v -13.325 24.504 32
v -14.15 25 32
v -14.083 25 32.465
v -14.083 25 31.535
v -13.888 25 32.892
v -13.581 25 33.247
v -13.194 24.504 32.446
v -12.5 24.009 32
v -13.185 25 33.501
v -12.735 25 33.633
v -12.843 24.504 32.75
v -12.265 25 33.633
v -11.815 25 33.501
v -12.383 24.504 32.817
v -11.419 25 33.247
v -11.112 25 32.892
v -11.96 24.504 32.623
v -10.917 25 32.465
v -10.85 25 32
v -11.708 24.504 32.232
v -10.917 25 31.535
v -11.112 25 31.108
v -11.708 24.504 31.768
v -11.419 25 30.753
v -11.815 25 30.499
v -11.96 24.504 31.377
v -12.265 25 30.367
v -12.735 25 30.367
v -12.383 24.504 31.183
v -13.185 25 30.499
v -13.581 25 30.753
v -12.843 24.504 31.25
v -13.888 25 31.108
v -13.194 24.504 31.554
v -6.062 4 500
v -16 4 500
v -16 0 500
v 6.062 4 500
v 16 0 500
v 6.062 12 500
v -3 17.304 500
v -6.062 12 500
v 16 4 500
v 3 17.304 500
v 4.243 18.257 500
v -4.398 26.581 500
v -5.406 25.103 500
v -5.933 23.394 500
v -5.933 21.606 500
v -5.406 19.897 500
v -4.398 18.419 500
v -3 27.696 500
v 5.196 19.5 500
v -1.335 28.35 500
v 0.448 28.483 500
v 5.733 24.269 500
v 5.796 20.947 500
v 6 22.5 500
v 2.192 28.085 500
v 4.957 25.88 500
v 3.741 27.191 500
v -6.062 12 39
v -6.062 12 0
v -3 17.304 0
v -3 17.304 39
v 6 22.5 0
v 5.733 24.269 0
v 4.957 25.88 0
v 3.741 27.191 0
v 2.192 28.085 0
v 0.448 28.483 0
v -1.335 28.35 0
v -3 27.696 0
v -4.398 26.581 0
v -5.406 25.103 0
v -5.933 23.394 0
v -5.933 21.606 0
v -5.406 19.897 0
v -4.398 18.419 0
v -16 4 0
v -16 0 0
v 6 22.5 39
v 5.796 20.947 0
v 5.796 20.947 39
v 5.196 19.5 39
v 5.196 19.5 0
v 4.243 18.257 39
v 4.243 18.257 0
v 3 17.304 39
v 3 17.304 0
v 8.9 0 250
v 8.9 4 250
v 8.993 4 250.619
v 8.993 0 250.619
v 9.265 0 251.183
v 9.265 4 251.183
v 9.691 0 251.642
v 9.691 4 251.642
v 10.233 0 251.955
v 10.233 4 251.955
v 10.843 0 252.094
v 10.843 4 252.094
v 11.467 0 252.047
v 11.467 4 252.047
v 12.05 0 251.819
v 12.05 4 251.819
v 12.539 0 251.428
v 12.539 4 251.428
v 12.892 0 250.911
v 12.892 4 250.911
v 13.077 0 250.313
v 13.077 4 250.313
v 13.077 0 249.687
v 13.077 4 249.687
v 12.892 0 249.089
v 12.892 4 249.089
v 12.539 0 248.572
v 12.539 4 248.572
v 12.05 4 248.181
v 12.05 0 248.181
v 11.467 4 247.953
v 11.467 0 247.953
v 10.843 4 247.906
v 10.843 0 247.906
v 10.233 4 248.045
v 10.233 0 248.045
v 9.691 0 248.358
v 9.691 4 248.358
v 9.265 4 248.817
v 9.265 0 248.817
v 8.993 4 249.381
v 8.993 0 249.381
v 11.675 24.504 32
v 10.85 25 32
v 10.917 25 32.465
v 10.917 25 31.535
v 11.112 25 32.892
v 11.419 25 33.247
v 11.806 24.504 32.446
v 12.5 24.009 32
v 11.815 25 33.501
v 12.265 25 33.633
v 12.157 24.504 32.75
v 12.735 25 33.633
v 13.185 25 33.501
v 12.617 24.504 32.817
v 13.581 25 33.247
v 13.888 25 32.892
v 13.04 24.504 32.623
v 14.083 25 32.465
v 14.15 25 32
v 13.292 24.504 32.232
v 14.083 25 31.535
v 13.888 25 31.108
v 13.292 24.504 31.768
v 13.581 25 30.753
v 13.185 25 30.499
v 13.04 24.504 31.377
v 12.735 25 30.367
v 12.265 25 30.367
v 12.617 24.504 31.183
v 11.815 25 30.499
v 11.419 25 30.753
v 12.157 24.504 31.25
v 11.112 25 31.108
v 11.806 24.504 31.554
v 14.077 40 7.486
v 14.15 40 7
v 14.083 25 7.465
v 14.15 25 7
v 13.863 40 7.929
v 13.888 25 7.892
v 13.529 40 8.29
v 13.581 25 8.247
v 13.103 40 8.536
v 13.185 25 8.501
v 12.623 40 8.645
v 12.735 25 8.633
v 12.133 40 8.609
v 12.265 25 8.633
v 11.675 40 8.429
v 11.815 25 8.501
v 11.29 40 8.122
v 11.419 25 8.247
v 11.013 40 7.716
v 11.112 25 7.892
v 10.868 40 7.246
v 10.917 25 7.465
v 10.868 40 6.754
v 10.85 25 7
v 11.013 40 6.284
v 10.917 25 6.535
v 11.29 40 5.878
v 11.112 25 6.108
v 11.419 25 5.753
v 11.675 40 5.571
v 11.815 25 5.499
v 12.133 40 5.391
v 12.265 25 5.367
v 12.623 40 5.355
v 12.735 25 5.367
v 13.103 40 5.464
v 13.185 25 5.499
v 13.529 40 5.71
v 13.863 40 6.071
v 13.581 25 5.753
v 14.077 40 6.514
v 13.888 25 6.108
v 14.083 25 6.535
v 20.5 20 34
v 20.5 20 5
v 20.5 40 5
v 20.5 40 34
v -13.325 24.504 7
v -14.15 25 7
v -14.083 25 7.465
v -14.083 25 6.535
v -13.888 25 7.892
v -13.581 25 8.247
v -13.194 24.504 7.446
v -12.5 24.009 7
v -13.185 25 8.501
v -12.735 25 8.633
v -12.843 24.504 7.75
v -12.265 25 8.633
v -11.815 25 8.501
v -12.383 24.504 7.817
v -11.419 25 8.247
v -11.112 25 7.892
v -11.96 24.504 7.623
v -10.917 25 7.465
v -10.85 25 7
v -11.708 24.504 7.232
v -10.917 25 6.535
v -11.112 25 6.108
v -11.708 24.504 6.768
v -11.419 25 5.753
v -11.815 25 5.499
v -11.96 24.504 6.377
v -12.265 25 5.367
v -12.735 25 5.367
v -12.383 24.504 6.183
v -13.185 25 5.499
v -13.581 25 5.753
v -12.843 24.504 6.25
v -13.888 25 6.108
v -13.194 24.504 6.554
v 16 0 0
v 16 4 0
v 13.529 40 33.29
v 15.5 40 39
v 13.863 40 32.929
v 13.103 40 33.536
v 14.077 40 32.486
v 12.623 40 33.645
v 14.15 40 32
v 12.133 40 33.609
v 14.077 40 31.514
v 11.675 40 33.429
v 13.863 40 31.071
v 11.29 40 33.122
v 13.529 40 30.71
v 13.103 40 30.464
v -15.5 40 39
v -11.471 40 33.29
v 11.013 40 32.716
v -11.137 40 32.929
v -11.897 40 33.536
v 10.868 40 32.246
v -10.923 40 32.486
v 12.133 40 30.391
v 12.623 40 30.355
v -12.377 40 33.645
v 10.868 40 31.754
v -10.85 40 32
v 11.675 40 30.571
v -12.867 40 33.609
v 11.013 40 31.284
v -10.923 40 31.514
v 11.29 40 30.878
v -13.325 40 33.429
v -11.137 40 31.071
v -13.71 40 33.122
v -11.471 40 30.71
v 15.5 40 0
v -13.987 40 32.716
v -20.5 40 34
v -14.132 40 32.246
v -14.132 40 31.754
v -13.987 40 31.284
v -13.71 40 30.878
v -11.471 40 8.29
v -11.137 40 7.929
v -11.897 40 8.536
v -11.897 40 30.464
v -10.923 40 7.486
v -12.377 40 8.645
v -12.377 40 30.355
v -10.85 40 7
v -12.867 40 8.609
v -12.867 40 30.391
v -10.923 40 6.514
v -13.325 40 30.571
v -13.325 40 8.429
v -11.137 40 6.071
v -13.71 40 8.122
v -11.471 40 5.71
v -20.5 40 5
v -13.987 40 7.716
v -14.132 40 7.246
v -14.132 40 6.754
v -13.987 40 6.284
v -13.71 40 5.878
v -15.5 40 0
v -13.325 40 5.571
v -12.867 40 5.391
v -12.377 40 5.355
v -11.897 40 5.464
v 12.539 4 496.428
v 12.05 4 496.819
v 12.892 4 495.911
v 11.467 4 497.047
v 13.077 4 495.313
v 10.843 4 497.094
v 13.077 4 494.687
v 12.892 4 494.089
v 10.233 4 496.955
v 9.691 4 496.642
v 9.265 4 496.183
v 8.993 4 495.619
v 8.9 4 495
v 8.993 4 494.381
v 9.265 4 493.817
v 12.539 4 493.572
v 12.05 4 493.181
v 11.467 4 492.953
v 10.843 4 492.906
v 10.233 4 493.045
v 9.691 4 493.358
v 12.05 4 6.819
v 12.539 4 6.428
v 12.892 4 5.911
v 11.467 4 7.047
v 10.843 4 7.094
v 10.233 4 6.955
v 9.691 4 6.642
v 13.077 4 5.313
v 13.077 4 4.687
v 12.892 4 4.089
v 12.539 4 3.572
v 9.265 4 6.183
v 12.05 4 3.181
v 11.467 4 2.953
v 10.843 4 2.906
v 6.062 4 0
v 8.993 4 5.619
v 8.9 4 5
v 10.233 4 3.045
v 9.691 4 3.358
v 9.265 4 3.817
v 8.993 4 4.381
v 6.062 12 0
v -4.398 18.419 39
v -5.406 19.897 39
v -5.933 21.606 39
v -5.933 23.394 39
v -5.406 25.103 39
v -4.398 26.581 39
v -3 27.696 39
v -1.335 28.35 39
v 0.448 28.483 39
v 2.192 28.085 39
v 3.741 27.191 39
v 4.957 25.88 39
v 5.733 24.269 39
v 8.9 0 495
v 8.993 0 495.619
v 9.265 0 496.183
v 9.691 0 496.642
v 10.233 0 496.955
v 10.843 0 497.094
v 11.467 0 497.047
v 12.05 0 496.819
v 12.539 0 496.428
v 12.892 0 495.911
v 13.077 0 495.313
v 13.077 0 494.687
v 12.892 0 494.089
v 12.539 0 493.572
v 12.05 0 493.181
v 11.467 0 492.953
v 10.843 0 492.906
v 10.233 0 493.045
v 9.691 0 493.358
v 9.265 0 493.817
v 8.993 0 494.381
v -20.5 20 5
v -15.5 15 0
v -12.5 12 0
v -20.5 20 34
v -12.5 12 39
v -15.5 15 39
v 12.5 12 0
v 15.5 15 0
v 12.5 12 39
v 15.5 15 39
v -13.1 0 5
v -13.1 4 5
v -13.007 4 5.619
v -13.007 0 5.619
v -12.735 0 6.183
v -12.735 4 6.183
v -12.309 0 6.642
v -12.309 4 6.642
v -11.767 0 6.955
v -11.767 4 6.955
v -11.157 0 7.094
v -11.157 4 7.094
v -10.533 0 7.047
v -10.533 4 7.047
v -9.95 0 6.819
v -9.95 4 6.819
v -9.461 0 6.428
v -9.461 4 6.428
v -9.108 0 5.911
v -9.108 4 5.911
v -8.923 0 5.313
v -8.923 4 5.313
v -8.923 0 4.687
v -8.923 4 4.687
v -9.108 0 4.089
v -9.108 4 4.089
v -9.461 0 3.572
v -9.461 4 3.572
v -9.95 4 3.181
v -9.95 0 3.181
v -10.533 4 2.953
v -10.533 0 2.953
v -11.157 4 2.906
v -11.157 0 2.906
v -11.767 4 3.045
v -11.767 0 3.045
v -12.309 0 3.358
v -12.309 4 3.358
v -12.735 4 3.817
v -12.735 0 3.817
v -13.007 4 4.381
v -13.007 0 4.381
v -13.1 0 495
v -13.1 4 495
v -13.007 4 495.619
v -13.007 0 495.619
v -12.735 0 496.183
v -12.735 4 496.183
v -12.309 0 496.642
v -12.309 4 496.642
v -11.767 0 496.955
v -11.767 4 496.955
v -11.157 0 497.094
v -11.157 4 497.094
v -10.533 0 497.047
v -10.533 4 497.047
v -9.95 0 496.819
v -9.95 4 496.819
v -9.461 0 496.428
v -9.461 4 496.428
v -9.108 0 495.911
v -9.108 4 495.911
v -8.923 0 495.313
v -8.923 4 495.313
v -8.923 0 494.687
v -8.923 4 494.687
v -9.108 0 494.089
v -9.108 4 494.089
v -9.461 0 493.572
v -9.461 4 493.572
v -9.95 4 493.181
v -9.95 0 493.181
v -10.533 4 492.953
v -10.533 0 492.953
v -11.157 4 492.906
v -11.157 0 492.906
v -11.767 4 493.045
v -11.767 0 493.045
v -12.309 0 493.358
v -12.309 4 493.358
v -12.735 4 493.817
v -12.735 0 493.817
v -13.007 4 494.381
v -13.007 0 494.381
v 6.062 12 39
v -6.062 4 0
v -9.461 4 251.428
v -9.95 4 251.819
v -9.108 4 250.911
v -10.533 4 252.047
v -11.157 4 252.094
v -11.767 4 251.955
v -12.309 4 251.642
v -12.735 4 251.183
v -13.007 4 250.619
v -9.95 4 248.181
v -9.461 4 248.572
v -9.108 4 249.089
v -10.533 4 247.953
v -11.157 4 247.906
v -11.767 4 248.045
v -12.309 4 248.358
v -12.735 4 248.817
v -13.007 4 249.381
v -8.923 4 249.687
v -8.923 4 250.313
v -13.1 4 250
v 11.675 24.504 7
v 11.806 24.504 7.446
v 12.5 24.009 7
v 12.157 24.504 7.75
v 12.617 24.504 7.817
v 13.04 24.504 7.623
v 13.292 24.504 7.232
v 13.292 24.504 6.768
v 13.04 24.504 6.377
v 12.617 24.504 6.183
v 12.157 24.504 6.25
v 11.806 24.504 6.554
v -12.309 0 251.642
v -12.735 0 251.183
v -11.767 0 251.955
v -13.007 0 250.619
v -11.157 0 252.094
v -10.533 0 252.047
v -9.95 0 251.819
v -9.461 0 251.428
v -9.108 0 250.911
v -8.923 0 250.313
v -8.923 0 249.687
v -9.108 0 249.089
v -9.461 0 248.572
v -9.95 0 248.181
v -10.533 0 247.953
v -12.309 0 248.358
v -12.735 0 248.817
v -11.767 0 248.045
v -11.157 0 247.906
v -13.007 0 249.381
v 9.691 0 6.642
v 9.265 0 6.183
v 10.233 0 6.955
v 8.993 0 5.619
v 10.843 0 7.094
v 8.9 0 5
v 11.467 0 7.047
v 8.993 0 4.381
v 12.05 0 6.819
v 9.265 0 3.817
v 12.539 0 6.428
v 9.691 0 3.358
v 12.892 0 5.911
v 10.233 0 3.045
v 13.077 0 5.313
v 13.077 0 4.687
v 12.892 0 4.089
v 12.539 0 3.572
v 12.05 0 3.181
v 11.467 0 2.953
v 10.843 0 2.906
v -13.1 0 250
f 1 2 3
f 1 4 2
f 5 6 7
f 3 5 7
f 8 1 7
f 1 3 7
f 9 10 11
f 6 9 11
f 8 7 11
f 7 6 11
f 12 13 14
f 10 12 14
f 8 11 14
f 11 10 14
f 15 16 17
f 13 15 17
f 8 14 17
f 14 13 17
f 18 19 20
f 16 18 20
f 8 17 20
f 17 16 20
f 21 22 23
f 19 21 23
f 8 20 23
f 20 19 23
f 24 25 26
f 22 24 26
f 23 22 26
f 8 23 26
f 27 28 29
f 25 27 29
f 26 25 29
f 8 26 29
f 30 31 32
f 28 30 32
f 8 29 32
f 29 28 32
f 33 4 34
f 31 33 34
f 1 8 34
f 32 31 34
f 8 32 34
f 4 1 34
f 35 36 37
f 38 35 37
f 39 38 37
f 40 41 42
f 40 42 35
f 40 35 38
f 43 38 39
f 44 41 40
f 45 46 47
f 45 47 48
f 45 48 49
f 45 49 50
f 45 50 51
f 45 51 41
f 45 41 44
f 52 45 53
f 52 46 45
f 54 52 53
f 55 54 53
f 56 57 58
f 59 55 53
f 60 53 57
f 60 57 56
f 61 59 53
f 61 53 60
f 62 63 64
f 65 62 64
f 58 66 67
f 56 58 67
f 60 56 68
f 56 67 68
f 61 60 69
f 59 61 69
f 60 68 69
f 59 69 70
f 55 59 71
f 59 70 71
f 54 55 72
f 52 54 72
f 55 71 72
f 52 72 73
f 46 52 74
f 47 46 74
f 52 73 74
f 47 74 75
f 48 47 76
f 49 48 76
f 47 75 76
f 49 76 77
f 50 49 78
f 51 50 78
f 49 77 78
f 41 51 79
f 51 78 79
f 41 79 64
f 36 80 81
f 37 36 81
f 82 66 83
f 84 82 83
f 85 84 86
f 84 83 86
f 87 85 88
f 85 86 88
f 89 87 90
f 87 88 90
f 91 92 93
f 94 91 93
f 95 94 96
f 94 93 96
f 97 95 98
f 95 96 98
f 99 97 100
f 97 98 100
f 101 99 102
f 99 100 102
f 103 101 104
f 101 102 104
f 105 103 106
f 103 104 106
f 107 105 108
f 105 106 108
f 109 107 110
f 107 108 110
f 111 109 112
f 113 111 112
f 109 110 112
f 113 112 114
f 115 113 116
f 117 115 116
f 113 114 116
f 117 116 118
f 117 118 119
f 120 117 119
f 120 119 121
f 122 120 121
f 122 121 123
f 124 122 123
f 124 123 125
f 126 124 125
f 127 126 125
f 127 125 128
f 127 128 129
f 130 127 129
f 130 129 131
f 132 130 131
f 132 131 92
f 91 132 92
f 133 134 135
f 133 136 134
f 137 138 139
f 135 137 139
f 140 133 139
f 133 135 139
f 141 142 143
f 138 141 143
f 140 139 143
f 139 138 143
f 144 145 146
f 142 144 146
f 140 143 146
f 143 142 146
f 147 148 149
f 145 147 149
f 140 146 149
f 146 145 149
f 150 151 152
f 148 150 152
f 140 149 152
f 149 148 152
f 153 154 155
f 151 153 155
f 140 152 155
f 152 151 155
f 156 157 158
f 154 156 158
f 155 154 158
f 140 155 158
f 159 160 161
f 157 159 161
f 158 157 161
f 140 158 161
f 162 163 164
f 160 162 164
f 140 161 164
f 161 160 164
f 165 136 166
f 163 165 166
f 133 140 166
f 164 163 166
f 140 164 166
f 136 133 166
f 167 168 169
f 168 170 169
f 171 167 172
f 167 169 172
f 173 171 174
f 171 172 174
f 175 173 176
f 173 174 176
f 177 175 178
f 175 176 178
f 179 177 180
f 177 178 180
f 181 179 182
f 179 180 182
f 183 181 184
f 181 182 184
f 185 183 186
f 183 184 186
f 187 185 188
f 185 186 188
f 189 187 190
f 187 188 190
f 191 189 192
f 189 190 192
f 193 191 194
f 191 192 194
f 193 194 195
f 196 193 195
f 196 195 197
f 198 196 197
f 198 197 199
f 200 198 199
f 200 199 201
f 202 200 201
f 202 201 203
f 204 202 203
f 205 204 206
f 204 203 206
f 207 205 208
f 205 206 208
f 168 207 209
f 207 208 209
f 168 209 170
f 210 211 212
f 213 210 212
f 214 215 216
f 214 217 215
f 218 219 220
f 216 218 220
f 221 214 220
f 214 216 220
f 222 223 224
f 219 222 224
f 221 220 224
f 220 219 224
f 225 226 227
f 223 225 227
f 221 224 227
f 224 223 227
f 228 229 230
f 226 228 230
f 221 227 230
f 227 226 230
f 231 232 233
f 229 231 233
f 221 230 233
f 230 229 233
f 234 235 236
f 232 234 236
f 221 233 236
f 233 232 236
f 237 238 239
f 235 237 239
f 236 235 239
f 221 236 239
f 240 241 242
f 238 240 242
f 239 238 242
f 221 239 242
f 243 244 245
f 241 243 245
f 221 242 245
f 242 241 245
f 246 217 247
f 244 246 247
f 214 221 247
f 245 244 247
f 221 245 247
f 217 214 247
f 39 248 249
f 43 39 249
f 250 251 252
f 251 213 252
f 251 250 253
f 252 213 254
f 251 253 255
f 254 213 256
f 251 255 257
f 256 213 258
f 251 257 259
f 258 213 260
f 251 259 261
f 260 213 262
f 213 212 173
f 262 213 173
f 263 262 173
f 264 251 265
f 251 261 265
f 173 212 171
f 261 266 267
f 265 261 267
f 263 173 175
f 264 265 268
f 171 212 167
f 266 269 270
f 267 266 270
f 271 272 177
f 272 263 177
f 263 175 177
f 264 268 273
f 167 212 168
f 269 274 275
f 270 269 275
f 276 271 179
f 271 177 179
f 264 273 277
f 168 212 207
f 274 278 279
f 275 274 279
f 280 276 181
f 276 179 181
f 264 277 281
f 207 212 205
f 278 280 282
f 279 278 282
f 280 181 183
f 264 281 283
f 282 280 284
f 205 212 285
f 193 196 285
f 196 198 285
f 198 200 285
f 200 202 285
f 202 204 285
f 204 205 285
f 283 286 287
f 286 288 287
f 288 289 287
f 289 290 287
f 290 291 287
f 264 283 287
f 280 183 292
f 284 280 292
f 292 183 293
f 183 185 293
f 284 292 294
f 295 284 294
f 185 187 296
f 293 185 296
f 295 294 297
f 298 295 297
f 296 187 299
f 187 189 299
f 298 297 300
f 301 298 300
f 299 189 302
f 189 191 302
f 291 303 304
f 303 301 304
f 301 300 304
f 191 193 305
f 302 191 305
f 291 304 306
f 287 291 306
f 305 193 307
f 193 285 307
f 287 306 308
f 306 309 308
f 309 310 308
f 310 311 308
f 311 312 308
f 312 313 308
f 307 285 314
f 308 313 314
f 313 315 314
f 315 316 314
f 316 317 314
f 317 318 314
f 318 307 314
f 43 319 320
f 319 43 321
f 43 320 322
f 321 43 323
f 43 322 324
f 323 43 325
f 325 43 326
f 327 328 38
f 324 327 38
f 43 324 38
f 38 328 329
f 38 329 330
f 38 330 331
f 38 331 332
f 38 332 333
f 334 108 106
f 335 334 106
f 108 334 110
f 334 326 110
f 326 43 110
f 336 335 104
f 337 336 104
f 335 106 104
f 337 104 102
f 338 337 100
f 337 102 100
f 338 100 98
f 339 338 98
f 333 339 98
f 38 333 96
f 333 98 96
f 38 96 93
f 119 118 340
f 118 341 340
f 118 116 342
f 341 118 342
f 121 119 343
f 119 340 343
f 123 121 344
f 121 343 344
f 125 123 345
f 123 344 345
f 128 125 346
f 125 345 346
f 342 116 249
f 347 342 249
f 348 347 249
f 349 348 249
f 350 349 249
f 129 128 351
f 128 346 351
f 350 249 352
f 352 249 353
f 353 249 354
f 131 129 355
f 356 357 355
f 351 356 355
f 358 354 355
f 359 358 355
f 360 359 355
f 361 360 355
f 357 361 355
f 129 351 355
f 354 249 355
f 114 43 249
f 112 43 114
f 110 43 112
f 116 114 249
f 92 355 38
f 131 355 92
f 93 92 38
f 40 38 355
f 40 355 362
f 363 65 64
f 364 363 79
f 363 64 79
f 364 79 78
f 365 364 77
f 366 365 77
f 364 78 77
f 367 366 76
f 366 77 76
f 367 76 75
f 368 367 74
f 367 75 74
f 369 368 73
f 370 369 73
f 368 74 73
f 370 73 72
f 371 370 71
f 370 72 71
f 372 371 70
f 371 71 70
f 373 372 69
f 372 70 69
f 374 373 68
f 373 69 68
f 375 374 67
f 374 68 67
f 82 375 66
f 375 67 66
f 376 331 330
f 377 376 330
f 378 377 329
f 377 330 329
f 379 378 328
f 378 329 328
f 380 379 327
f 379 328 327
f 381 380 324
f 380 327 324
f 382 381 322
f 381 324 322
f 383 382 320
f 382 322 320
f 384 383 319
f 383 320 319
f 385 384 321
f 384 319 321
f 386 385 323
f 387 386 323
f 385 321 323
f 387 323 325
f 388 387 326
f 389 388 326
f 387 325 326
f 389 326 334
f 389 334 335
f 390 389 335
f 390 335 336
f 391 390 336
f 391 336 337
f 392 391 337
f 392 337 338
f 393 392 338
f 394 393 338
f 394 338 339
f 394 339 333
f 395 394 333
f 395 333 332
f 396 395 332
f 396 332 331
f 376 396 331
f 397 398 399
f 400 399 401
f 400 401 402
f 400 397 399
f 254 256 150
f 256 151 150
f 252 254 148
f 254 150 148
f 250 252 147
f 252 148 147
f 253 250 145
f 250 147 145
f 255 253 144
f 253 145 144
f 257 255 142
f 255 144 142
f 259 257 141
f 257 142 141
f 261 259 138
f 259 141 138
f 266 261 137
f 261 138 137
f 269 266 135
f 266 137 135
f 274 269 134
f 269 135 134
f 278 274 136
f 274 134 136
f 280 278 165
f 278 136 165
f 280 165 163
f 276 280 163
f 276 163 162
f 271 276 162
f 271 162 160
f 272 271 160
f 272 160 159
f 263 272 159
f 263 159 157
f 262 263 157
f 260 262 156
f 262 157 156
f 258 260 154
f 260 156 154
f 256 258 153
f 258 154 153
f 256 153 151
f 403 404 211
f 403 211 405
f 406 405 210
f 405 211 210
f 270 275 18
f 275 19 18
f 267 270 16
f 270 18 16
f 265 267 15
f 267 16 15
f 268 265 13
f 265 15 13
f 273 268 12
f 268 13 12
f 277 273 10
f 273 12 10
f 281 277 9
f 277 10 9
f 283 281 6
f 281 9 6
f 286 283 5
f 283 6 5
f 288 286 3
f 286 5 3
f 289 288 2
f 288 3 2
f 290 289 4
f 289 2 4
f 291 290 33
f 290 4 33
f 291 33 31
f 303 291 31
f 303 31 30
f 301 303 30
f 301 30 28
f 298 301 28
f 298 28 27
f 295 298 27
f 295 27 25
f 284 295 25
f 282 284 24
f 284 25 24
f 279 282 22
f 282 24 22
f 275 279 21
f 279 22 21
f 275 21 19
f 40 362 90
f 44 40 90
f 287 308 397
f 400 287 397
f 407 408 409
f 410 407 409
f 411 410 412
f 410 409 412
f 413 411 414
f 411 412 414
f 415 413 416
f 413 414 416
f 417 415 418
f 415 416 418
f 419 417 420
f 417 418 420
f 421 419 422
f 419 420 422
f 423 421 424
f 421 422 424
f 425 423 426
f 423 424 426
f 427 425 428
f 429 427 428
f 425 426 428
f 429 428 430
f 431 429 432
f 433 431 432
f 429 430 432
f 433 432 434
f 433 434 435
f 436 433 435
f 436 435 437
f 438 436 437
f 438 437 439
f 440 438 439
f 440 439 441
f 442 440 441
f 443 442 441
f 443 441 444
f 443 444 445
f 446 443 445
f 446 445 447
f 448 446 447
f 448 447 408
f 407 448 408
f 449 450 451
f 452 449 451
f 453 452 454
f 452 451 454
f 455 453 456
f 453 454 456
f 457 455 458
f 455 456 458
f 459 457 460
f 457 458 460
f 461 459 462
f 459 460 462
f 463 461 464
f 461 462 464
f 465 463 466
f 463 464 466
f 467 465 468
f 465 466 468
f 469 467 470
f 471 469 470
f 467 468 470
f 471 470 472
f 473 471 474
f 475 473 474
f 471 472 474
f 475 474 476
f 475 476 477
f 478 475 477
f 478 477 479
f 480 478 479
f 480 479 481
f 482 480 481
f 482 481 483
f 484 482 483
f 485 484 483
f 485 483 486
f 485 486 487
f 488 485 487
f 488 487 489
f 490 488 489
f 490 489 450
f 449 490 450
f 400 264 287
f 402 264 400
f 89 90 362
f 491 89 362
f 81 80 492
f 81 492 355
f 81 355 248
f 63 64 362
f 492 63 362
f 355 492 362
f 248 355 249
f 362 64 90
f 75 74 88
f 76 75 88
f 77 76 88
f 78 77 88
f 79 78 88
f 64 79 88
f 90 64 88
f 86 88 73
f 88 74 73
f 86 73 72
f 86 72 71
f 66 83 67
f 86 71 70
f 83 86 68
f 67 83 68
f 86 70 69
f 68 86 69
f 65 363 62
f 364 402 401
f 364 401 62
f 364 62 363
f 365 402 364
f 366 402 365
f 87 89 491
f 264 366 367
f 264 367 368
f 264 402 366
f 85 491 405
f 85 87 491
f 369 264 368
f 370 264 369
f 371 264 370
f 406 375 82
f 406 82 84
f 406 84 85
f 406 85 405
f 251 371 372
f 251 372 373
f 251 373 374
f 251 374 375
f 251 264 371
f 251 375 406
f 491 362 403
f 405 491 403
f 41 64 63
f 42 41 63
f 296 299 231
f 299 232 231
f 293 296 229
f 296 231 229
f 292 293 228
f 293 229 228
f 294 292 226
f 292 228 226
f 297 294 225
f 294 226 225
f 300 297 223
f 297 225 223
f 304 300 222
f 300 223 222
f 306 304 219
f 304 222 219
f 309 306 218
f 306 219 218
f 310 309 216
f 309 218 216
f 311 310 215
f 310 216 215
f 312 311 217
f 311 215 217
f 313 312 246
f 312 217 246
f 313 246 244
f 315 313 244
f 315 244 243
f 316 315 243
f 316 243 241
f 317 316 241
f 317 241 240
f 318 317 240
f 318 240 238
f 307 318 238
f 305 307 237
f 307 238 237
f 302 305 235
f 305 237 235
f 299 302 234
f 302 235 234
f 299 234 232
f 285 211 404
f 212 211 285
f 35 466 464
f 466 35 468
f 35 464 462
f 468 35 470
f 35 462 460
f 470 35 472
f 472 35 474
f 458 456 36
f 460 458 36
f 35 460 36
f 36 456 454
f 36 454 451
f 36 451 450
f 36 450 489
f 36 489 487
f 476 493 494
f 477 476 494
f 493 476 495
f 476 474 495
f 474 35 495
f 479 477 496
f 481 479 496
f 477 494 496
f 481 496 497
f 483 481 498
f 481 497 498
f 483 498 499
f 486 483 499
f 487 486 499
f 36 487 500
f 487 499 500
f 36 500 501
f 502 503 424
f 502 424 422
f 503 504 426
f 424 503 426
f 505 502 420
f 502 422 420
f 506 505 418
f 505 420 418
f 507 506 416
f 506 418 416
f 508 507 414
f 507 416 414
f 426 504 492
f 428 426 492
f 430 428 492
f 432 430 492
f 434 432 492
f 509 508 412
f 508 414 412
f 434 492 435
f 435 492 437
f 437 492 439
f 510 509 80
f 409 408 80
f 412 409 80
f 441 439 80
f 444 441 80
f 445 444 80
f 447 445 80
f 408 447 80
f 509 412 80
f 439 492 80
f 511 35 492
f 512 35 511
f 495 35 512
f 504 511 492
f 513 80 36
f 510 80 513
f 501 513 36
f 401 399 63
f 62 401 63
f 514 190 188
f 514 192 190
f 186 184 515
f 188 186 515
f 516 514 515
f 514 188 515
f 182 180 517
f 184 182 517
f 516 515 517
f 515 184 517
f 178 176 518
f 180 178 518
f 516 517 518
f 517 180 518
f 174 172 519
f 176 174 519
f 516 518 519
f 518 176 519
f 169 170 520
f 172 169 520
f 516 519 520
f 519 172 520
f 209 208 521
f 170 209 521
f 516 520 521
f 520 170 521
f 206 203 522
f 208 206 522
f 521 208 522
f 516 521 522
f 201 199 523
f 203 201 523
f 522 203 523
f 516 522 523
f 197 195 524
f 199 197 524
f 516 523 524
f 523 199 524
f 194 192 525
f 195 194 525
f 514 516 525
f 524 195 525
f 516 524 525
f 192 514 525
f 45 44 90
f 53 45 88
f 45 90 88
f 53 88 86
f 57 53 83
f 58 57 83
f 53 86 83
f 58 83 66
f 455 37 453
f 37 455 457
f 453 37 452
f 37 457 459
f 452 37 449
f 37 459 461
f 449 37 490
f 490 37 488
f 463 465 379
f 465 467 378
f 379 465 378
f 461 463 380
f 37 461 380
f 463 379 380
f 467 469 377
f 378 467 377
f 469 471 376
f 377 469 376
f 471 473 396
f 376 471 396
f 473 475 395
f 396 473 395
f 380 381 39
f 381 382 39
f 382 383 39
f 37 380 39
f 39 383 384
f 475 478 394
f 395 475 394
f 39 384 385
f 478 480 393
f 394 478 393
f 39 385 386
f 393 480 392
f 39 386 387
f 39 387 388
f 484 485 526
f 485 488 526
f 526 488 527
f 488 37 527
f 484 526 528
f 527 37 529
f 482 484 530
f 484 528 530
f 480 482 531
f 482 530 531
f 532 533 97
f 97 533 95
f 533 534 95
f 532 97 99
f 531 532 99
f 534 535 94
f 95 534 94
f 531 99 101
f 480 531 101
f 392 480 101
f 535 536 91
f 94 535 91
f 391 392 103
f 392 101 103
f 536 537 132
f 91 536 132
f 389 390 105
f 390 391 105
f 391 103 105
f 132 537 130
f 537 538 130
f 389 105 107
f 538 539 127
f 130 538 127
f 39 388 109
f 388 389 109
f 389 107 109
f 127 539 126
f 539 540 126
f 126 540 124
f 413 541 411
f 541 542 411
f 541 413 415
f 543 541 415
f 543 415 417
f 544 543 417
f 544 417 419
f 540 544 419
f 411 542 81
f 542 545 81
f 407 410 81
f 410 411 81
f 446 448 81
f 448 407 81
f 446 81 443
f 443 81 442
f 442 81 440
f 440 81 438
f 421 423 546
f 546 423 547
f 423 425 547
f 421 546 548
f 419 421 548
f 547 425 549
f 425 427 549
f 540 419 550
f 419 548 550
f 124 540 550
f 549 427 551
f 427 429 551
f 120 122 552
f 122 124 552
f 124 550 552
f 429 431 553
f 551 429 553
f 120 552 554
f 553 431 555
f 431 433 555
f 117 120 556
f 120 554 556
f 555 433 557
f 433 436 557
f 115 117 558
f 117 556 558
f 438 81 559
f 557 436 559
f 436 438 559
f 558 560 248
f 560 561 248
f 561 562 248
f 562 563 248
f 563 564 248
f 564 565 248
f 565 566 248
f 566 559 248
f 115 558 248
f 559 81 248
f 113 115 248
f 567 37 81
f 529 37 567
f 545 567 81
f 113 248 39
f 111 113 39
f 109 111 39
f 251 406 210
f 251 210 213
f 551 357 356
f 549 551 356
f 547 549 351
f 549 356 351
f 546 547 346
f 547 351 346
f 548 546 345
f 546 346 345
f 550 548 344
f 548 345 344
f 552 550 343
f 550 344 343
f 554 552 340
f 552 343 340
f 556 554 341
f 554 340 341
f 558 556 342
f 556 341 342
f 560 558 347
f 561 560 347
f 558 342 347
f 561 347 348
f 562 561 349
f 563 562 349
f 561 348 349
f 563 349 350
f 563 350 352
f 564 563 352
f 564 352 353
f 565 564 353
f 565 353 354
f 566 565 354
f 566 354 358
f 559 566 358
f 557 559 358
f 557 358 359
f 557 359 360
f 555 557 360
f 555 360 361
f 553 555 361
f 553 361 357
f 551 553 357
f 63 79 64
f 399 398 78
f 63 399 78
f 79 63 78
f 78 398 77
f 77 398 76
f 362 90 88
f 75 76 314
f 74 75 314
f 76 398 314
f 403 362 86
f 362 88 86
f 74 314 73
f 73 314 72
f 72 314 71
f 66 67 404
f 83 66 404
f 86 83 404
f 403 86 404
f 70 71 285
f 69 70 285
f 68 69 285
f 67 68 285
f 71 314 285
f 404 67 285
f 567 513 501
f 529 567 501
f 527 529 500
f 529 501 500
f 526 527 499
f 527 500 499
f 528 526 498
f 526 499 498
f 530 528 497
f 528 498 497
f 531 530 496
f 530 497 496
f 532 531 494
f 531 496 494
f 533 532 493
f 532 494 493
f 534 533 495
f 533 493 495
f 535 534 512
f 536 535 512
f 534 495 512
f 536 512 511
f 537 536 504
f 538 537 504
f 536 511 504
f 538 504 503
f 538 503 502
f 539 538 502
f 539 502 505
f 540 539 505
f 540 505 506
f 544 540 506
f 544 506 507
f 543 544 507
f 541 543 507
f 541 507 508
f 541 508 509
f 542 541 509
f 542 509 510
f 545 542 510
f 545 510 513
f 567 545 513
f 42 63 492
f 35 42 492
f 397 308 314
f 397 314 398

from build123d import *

# Parameters (mm, degrees)
F1_DEPTH = 500
F2_DEPTH = 39
F4_D     = 3.3
F4_DEPTH = 15
F4_TIP   = 0.9914200214
F5_SIZE  = 8
F6_SIZE  = 5
F8_D     = 4.2
F8_DEPTH = 7
F8_TIP   = 1.2618073


with BuildPart() as f1:
    # F0 (on Top) → F1 (new body)
    with BuildSketch(Plane.XY):
        with BuildLine():
            ThreePointArc((3, 17.3038475773), (5.1961524227, 19.5), (6, 22.5))
            ThreePointArc((6, 22.5), (-3, 27.6961524227), (-3, 17.3038475773))
            ThreePointArc((-3, 17.3038475773), (0, 16.5), (3, 17.3038475773))
        make_face()
        with BuildLine():
            ThreePointArc((3, 17.3038475773), (0, 16.5), (-3, 17.3038475773))
            Line((-3, 17.3038475773), (-6.0621778265, 12))
            Line((-6.0621778265, 12), (-6.0621778265, 4))
            Line((-6.0621778265, 4), (6.0621778265, 4))
            Line((6.0621778265, 4), (6.0621778265, 12))
            Line((6.0621778265, 12), (3, 17.3038475773))
        make_face()
        Polygon((6.0621778265, 4), (-6.0621778265, 4), (-16, 4), (-16, 0), (16, 0), (16, 4), align=None)
    extrude(amount=F1_DEPTH)

    # F8
    with Locations(Plane.XZ):
        with Locations((11, 5), (-11, 5), (11, 250), (-11, 250), (11, 495), (-11, 495)):
            Hole(F8_D / 2, depth=F8_DEPTH)
            with Locations((0, 0, -(F8_DEPTH + F8_TIP / 2))):  # 118° drill point
                Cone(0, F8_D / 2, F8_TIP, mode=Mode.SUBTRACT)


with BuildPart() as f2:
    # F0 (on Top) → F2 (new body)
    with BuildSketch(Plane.XY):
        with BuildLine():
            ThreePointArc((-3, 17.3038475773), (-3, 27.6961524227), (6, 22.5))
            ThreePointArc((6, 22.5), (5.1961524227, 19.5), (3, 17.3038475773))
            Line((3, 17.3038475773), (6.0621778265, 12))
            Line((6.0621778265, 12), (20.5, 12))
            Line((20.5, 12), (20.5, 40))
            Line((20.5, 40), (-20.5, 40))
            Line((-20.5, 40), (-20.5, 12))
            Line((-20.5, 12), (-6.0621778265, 12))
            Line((-6.0621778265, 12), (-3, 17.3038475773))
        make_face()
    extrude(amount=F2_DEPTH)

    # F4
    with Locations(Plane(origin=(0, 40, 0), x_dir=(-1, 0, 0), z_dir=(0, 1, 0))):
        with Locations((-12.5, 32), (-12.5, 7), (12.5, 7), (12.5, 32)):
            Hole(F4_D / 2, depth=F4_DEPTH)
            with Locations((0, 0, -(F4_DEPTH + F4_TIP / 2))):  # 118° drill point
                Cone(0, F4_D / 2, F4_TIP, mode=Mode.SUBTRACT)

    # F5
    f5_edges = [f2.edges().sort_by_distance(p)[0] for p in [
        (20.5, 12, 19.5),
        (-20.5, 12, 19.5),
    ]]
    chamfer(f5_edges, length=F5_SIZE)

    # F6
    f6_edges = [f2.edges().sort_by_distance(p)[0] for p in [
        (20.5, 30, 39),
        (20.5, 30, 0),
        (-20.5, 30, 0),
        (-20.5, 30, 39),
    ]]
    chamfer(f6_edges, length=F6_SIZE)


solid = Compound([f1.part, f2.part])
